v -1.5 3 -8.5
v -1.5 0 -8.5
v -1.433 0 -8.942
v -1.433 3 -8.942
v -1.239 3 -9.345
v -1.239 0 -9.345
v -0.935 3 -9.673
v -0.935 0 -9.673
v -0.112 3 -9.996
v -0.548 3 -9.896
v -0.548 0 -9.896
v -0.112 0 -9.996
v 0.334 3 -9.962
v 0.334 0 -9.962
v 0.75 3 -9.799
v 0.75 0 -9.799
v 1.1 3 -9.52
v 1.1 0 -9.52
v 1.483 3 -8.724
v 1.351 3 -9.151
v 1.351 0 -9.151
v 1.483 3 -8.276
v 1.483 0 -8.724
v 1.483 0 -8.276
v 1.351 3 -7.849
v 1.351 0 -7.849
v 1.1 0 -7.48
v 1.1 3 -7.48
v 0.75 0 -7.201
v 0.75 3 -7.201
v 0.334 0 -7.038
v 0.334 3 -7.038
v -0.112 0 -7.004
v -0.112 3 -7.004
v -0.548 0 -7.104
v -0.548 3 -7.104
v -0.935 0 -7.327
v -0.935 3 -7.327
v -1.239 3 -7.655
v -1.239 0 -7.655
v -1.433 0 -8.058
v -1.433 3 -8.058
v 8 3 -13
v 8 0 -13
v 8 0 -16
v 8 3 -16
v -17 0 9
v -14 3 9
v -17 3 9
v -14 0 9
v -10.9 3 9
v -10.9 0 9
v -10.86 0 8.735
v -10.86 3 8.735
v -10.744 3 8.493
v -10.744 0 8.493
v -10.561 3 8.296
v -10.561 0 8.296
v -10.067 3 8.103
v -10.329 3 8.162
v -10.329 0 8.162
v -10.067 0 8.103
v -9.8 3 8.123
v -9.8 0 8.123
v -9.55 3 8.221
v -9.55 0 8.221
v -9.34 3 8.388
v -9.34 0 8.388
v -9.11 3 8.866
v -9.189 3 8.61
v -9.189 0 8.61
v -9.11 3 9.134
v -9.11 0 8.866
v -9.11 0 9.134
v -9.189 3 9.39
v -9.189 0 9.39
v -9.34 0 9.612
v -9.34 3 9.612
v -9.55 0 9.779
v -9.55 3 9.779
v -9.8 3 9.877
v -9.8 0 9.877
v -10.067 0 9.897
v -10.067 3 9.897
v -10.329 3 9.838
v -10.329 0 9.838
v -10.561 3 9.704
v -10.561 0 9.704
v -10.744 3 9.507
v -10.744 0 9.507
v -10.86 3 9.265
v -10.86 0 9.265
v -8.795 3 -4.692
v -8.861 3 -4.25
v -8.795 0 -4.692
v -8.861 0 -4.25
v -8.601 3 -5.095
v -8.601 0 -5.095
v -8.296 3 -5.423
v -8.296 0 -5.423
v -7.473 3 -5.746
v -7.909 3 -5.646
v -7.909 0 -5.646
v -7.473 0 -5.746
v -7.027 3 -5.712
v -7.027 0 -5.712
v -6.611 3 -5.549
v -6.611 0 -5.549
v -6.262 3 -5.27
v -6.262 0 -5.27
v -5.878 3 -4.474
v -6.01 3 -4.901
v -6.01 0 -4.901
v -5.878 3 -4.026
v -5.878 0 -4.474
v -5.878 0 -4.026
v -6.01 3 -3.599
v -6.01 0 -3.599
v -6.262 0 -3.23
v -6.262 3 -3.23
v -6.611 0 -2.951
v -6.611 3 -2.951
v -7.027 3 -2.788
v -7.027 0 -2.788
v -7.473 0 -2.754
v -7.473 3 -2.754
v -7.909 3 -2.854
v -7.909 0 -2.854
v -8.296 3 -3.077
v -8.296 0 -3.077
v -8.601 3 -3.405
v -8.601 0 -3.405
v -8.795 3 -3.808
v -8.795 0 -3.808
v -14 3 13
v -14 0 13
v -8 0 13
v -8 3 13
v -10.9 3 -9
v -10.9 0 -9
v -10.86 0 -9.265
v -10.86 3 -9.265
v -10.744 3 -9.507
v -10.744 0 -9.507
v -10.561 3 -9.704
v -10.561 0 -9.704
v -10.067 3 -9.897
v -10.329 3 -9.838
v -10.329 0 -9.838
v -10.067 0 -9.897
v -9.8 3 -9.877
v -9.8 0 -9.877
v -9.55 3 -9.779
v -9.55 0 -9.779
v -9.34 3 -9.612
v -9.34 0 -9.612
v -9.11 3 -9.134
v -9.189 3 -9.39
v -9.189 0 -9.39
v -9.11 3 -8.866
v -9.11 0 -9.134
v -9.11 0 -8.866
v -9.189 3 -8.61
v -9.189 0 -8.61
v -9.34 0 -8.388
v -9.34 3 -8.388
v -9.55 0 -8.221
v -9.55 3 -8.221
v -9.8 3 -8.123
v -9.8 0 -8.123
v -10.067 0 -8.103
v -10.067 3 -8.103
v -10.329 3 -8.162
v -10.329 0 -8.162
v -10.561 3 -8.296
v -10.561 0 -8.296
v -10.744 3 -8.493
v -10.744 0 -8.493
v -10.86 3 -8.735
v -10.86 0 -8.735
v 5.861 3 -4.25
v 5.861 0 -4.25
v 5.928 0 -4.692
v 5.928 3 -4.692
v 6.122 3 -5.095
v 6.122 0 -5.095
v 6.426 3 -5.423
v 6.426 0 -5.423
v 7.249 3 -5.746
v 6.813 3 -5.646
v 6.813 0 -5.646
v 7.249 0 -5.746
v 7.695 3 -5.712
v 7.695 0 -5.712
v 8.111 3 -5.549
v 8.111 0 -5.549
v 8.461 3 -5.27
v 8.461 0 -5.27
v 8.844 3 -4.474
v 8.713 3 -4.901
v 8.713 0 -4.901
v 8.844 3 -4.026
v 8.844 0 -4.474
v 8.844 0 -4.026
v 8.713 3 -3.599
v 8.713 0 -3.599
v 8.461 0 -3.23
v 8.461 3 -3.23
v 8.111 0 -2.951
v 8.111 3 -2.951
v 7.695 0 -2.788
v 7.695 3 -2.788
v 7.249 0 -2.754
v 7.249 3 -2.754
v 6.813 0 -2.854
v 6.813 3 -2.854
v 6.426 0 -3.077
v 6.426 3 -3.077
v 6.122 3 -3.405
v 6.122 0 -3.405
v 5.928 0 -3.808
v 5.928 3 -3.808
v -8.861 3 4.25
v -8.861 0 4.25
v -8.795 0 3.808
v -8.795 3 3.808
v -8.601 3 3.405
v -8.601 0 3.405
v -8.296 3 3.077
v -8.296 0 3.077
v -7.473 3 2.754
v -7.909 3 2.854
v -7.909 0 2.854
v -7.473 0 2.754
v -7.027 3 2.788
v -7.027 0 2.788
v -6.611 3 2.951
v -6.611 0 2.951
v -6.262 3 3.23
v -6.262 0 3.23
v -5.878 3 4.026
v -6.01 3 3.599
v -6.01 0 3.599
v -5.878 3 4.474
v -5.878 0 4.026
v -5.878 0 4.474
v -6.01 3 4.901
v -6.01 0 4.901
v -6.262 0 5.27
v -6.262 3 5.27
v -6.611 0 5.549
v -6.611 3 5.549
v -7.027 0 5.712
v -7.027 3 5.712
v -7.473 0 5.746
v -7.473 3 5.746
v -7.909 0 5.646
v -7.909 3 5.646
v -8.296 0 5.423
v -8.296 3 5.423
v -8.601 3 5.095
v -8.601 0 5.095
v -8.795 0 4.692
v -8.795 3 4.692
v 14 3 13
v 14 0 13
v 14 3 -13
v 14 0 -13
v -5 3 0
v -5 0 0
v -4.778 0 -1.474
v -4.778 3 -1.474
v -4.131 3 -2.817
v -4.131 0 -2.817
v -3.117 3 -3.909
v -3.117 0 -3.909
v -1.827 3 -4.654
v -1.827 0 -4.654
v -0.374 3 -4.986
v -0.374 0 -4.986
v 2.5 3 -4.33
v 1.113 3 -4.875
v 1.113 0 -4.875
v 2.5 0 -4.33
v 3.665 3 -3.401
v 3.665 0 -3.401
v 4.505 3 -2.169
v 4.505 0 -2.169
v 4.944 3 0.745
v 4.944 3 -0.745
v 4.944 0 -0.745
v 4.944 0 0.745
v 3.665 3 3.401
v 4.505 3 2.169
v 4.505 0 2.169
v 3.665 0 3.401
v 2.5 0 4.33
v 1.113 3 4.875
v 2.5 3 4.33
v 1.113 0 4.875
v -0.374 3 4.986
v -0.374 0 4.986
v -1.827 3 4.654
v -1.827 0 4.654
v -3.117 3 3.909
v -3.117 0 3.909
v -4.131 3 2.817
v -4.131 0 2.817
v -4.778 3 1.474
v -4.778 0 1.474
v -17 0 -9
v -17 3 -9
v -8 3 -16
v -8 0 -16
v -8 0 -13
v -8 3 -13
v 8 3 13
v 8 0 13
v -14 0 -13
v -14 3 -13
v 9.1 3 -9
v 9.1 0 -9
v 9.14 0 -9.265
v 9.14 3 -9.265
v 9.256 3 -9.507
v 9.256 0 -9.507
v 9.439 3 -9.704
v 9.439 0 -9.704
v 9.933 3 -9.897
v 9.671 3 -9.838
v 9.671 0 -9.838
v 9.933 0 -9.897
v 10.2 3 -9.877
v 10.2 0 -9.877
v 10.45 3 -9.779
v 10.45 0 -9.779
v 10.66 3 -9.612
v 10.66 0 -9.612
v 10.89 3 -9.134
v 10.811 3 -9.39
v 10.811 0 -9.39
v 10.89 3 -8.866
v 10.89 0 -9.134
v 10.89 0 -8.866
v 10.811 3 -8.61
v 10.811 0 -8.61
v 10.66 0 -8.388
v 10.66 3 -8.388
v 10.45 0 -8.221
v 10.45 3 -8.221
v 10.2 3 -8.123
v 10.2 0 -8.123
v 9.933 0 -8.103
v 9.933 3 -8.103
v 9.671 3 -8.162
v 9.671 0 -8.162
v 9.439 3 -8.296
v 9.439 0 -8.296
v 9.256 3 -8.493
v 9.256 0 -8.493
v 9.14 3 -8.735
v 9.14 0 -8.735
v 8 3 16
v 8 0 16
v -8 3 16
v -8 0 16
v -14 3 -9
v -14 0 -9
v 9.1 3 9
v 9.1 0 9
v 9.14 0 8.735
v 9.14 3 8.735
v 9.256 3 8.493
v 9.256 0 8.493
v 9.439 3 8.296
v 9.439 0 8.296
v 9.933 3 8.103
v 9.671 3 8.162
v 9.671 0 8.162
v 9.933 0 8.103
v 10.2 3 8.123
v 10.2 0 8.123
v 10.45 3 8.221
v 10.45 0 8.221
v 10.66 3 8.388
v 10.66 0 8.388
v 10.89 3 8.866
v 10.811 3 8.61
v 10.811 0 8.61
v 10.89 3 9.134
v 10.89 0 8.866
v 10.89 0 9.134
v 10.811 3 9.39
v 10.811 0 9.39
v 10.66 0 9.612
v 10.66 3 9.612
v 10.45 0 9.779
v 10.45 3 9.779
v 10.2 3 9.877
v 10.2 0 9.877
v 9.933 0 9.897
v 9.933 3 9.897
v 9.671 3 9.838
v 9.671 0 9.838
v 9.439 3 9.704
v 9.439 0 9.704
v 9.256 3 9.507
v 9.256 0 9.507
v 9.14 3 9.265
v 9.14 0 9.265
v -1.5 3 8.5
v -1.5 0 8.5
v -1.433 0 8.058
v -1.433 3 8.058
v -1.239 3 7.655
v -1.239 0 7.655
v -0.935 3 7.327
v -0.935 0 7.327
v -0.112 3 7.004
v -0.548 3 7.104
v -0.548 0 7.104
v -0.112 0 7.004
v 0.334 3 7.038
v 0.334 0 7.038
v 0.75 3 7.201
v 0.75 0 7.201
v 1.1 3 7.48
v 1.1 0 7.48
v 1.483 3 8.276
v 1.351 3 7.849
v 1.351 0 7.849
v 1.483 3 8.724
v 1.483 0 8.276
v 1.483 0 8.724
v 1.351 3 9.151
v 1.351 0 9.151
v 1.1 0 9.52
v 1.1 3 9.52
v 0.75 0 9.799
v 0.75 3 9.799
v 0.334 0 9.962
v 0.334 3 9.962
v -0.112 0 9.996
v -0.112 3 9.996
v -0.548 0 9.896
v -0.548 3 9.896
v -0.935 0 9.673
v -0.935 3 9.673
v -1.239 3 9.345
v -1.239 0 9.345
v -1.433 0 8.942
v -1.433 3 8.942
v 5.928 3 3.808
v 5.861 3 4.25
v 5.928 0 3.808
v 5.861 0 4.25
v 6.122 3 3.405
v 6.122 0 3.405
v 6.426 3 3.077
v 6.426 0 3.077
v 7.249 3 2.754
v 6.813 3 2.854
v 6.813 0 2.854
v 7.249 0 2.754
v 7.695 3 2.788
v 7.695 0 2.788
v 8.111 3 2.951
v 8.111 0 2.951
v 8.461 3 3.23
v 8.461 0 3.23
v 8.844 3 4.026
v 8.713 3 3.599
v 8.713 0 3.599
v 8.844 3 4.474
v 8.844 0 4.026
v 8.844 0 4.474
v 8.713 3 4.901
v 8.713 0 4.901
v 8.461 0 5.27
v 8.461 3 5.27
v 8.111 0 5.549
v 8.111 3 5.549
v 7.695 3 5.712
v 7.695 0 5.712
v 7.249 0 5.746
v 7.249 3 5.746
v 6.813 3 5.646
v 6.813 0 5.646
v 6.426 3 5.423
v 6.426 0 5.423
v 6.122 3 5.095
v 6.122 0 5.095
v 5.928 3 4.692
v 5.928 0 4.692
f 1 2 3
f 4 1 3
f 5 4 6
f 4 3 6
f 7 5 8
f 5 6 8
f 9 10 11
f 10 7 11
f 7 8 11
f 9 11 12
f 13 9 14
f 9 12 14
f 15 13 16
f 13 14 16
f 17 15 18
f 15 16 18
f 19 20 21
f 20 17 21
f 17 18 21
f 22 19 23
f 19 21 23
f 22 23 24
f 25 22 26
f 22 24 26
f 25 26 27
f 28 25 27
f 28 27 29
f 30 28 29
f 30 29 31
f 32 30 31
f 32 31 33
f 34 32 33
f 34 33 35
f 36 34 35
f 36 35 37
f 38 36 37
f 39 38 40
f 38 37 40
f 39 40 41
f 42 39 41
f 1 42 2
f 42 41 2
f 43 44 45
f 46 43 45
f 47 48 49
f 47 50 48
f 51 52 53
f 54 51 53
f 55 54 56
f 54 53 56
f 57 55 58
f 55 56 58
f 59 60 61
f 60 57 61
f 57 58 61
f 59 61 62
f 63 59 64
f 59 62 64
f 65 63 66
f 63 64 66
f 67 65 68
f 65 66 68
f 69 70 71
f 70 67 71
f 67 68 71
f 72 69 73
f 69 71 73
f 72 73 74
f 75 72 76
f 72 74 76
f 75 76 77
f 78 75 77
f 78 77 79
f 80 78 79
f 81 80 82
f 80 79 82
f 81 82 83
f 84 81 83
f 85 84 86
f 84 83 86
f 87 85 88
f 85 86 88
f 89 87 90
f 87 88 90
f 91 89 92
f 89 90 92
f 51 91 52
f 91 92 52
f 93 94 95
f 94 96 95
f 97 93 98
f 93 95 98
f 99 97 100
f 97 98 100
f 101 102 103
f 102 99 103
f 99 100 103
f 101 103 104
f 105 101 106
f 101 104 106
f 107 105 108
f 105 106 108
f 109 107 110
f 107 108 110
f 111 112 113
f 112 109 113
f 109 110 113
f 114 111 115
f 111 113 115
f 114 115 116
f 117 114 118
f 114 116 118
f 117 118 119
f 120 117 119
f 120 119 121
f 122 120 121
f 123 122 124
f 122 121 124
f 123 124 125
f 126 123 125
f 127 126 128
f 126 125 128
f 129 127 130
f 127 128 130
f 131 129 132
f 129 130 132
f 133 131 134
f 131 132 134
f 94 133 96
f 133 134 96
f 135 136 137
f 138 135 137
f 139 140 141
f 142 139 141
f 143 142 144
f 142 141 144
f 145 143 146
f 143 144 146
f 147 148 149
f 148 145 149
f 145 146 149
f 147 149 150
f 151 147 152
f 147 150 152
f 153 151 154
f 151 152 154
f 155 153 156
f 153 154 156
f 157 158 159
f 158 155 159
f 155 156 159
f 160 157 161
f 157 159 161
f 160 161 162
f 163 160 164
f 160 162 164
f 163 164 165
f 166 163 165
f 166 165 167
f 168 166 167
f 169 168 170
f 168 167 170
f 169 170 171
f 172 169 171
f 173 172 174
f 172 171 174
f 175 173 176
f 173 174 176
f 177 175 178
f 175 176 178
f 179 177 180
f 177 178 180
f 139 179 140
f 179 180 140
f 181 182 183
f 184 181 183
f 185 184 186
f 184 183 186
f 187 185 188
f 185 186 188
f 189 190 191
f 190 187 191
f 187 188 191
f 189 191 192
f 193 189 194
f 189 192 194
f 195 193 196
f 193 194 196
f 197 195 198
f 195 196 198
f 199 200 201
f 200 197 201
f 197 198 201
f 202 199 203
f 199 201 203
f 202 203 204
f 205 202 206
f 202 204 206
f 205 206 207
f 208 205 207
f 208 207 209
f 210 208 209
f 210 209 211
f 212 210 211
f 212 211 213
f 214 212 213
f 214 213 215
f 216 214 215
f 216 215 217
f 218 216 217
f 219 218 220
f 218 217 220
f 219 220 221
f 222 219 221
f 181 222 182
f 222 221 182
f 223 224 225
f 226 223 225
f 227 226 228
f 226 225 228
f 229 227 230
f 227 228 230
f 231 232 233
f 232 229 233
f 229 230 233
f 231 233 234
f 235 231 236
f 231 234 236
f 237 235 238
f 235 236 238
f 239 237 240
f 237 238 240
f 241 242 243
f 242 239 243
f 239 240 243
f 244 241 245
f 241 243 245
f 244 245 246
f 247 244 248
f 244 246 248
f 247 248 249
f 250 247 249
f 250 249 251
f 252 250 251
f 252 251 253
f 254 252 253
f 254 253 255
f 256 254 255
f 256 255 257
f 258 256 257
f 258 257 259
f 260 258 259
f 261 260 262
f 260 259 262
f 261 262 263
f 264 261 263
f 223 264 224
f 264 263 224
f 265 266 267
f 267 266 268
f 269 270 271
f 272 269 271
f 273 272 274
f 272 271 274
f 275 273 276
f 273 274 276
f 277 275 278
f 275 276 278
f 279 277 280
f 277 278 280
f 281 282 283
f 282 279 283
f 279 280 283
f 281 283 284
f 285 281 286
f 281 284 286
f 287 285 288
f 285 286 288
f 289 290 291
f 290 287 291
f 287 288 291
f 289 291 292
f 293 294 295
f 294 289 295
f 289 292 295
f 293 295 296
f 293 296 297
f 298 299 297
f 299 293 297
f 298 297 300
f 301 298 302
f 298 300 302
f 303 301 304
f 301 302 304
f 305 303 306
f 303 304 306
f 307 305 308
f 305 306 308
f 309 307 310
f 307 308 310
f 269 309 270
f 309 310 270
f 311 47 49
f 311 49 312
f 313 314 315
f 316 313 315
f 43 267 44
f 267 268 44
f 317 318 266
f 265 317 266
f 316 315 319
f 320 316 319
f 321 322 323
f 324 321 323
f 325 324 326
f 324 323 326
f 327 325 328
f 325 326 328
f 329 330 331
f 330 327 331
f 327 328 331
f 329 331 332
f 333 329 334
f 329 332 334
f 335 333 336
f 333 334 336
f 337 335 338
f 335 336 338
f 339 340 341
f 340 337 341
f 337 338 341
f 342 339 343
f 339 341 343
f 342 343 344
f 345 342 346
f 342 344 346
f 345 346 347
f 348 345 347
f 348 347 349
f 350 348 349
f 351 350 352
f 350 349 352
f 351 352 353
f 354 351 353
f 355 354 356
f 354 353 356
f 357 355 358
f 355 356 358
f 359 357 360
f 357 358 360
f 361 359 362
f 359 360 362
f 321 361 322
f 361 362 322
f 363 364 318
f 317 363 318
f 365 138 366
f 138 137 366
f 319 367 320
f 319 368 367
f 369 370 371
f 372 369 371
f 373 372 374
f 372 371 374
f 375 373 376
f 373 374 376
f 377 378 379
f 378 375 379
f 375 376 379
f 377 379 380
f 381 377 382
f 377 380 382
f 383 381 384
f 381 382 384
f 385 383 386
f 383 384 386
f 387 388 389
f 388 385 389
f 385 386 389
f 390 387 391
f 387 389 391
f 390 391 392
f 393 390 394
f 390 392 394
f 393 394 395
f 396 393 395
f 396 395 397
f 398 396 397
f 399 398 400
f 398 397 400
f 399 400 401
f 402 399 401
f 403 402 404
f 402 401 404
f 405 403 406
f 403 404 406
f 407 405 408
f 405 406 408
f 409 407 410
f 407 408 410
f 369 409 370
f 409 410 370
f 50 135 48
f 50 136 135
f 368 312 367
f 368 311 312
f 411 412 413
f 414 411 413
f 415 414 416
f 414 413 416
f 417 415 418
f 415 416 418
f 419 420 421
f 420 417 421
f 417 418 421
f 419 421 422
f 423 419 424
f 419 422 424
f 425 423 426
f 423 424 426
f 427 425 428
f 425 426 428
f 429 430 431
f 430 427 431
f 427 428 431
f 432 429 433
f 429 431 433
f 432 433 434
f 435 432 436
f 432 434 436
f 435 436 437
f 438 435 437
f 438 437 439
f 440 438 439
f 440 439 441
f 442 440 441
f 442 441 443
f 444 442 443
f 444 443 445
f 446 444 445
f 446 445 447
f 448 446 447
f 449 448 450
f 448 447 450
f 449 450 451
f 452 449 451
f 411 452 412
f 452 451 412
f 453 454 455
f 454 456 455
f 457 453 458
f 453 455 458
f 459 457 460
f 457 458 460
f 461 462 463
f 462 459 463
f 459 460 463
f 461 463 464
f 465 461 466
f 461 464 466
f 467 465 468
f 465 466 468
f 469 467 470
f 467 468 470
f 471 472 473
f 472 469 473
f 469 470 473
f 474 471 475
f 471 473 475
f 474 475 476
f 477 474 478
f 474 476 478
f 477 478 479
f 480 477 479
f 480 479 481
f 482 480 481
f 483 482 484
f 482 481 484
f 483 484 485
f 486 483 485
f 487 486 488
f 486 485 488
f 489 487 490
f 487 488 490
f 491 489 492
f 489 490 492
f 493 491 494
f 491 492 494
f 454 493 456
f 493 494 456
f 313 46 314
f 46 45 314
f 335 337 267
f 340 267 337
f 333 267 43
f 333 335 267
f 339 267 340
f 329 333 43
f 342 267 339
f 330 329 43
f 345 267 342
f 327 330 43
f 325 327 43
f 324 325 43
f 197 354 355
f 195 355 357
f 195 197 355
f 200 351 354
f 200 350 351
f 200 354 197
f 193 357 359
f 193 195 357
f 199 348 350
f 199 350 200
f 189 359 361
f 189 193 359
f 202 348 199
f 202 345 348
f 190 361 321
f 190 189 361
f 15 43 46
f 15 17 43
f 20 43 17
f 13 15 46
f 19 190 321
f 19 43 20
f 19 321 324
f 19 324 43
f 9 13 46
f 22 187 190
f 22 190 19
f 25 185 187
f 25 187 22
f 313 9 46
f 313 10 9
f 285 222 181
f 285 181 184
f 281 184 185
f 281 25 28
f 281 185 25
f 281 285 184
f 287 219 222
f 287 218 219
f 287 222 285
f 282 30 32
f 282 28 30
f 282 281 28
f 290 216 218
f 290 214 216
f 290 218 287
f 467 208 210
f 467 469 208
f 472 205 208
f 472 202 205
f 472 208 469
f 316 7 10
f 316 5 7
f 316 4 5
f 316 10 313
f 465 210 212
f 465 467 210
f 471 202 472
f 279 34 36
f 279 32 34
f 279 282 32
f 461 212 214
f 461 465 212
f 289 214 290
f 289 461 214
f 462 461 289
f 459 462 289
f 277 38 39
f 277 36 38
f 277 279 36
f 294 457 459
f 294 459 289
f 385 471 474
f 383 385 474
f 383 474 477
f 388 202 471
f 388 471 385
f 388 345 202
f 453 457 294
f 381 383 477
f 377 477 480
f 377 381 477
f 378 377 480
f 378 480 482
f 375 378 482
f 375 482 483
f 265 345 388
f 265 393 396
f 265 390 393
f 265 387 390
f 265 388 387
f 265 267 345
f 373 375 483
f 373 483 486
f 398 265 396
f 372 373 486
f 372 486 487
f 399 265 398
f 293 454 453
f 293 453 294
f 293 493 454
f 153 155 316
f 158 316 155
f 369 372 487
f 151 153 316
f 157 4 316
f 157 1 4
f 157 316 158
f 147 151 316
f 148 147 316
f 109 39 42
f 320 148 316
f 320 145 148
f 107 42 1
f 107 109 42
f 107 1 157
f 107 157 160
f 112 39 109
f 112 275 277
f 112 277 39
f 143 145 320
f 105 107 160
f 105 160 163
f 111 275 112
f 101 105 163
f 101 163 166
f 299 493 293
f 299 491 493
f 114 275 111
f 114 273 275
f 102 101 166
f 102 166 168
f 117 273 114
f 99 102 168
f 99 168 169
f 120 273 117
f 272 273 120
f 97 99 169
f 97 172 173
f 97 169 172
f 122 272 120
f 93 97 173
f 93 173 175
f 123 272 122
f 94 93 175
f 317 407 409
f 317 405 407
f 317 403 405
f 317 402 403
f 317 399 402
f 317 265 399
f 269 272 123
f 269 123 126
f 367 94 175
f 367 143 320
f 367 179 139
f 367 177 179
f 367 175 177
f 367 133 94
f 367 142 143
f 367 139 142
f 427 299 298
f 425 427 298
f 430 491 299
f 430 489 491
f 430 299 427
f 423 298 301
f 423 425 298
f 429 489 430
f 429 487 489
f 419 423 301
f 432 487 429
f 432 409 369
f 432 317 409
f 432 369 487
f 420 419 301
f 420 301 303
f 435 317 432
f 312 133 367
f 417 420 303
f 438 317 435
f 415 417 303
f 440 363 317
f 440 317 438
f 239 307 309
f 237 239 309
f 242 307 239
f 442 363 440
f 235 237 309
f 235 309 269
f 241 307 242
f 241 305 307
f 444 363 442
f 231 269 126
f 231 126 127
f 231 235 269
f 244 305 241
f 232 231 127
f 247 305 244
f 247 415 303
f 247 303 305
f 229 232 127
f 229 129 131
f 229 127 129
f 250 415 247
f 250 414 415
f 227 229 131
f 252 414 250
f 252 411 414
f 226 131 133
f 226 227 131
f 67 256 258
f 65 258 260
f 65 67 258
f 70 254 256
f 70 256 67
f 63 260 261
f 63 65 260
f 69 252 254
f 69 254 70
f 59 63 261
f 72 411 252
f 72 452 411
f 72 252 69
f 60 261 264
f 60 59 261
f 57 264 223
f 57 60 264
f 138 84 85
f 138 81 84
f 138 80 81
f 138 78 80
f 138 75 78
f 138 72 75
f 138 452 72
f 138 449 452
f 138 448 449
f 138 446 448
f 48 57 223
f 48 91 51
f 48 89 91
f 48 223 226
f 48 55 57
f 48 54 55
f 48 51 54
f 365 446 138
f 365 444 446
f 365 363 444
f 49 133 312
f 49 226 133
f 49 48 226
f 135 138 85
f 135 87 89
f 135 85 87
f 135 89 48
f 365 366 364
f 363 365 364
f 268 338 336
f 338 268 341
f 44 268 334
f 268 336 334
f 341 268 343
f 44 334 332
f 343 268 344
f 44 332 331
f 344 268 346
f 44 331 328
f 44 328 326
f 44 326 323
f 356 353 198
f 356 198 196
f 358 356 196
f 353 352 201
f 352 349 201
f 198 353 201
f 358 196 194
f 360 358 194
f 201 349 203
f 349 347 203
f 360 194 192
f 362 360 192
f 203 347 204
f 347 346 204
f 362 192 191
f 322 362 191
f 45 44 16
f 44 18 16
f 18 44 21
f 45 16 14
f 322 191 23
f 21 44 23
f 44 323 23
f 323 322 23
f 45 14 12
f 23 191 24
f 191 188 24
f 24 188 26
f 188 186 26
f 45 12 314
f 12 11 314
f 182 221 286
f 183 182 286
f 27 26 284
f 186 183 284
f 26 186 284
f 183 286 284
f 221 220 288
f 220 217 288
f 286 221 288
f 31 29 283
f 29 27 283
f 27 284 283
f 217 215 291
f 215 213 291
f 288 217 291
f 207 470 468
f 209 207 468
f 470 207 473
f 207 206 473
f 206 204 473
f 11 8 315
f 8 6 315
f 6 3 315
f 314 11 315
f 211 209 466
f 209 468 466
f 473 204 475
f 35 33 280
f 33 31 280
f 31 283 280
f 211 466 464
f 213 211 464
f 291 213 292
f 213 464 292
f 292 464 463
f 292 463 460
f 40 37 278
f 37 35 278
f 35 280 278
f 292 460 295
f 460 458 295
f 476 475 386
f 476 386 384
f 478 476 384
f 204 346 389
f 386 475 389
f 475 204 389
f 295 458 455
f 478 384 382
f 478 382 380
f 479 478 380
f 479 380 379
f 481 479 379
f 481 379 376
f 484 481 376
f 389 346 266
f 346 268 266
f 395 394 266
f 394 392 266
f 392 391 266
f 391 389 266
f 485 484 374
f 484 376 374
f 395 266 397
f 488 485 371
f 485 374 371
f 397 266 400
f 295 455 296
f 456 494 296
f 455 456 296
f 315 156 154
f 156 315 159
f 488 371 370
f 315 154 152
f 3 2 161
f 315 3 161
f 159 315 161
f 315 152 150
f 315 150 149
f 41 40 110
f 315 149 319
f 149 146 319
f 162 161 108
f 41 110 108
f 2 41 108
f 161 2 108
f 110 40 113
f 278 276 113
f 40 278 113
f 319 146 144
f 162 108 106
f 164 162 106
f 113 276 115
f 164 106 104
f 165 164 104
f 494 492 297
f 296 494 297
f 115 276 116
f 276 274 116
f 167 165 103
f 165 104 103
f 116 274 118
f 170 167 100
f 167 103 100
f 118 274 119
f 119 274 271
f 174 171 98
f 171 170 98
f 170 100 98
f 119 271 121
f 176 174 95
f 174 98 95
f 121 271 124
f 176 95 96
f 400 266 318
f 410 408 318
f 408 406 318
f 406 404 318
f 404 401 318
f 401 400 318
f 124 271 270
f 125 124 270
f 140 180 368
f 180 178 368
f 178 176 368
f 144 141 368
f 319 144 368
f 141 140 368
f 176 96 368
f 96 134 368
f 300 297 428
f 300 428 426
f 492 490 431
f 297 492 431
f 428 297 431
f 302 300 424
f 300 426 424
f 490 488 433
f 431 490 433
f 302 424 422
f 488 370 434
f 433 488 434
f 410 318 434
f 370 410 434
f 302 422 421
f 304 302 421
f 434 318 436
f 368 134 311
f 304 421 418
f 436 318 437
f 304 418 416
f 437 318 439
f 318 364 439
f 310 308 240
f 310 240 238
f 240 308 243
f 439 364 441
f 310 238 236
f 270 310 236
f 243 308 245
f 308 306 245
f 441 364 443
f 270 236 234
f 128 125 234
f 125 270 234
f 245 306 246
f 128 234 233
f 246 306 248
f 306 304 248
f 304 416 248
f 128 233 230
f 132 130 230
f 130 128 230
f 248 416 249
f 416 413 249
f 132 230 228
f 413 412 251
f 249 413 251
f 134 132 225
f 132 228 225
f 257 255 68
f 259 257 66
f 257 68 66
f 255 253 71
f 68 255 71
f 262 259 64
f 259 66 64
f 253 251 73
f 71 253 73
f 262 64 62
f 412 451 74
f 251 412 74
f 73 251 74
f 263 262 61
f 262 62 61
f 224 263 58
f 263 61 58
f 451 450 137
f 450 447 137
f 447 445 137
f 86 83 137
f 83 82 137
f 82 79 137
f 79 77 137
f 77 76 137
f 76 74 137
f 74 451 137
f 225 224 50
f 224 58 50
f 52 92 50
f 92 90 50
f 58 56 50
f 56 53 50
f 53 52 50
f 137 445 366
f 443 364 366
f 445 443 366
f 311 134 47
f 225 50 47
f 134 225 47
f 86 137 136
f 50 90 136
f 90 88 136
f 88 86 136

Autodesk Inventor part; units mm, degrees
ref_plane "YZ Plane" through (0, 0, 0) normal (1, 0, 0) x (0, 1, 0)
ref_plane "XZ Plane" through (0, 0, 0) normal (0, 1, 0) x (-1, 0, 0)
ref_plane "XY Plane" through (0, 0, 0) normal (0, 0, 1) x (1, 0, 0)
sketch "Sketch1" plane through (0, 0, 0) normal (0, 1, 0) x (-1, 0, 0)
  circle A0 centre (0, 0) radius 11 construction
  circle A1 centre (0, 0) radius 8.5 construction
  circle A2 centre (0, -8.5) radius 1.5
  circle A3 centre (7.3612, -4.25) radius 1.5
  circle A4 centre (7.3612, 4.25) radius 1.5
  circle A5 centre (0, 8.5) radius 1.5
  circle A6 centre (-7.3612, 4.25) radius 1.5
  circle A7 centre (-7.3612, -4.25) radius 1.5
  circle A8 centre (0, 0) radius 5
  line L0 (14, 16) -> (-14, 16) construction
  line L1 (-14, 16) -> (-14, -16) construction
  line L2 (-14, -16) -> (14, -16) construction
  line L3 (14, -16) -> (14, 16) construction
  line L4 (11, 16) -> (11, -16) construction
  line L5 (14, 13) -> (-14, 13) construction
  line L6 (-11, 16) -> (-11, -16) construction
  line L7 (14, -13) -> (-14, -13) construction
  line L8 (8, 16) -> (-8, 16)
  line L9 (-8, 16) -> (-8, 13)
  line L10 (-8, 13) -> (-14, 13)
  line L11 (-14, 13) -> (-14, -13)
  line L12 (-14, -13) -> (-8, -13)
  line L13 (-8, -13) -> (-8, -16)
  line L14 (-8, -16) -> (8, -16)
  line L15 (8, -16) -> (8, -13)
  line L16 (8, -13) -> (14, -13)
  line L17 (14, 13) -> (8, 13)
  line L18 (8, 13) -> (8, 16)
  circle A9 centre (0, 0) radius 25 construction
  line L19 (14, 13) -> (14, 9)
  line L20 (14, 9) -> (17, 9)
  line L21 (17, 9) -> (17, -9)
  line L22 (17, -9) -> (14, -9)
  line L23 (14, -9) -> (14, -13)
  circle A10 centre (10, 9) radius 0.9
  circle A11 centre (-10, 9) radius 0.9
  circle A12 centre (10, -9) radius 0.9
  circle A13 centre (-10, -9) radius 0.9
  point P0 (0, -16)
  point P1 (14, 0)
  point P2 (0, 16)
  point P3 (17, 0)
  dimension "d1" = 17
  dimension "d0" = 22
  dimension "d3" = 3
  dimension "d6" = 360
  dimension "d8" = 10
  dimension "d9" = 28
  dimension "d10" = 32
  dimension "d11" = 3
  dimension "d12" = 3
  dimension "d13" = 3
  dimension "d14" = 3
  dimension "d16" = 50
  dimension "d19" = 6
  dimension "d20" = 3
  dimension "d21" = 4
  dimension "d22" = 1.8
  dimension "d23" = 4
  dimension "d24" = 4
  dimension "d25" = 1.8
  dimension "d26" = 4
  dimension "d27" = 1.8
  dimension "d28" = 4
  dimension "d29" = 1.8
extrude "Extrusion1" add sketch "Sketch1" along normal blind 3
sketch "Sketch3" plane through (0, 0, 0) normal (0, -1, 0) x (1, 0, 0)
  circle A0 centre (0, 0) radius 5 projected
  circle A1 centre (10, -9) radius 0.9 projected
  circle A2 centre (-10, -9) radius 0.9 projected
  circle A3 centre (10, 9) radius 0.9 projected
  circle A4 centre (-10, 9) radius 0.9 projected
  circle A5 centre (7.3612, -4.25) radius 1.5 projected
  circle A6 centre (7.3612, 4.25) radius 1.5 projected
  circle A7 centre (0, 8.5) radius 1.5 projected
  circle A8 centre (-7.3612, 4.25) radius 1.5 projected
  circle A9 centre (-7.3612, -4.25) radius 1.5 projected
  circle A10 centre (0, -8.5) radius 1.5 projected
  line L0 (-14, 13) -> (-8, 13) projected
  line L1 (-14, 9) -> (-14, 13) projected
  line L2 (-17, 9) -> (-14, 9) projected
  line L3 (-17, -9) -> (-17, 9) projected
  line L4 (-14, -9) -> (-17, -9) projected
  line L5 (-14, -13) -> (-14, -9) projected
  line L6 (-8, -13) -> (-14, -13) projected
  line L7 (-8, -16) -> (-8, -13) projected
  line L8 (8, -16) -> (-8, -16) projected
  line L9 (8, -13) -> (8, -16) projected
  line L10 (14, -13) -> (8, -13) projected
  line L11 (14, 13) -> (14, -13) projected
  line L12 (8, 13) -> (14, 13) projected
  line L13 (8, 16) -> (8, 13) projected
  line L14 (-8, 16) -> (8, 16) projected
  line L15 (-8, 13) -> (-8, 16) projected
equation "\"d12\" = d11"
equation "\"d13\" = d11"
equation "\"d14\" = d11"
equation "\"d20\" = d11"
equation "\"d24\" = d23"
equation "\"d25\" = d22"
equation "\"d26\" = d24"
equation "\"d27\" = d22"
equation "\"d28\" = d23"
equation "\"d29\" = d22"
properties part number "motor mount" material "Polycarbonate, Clear"
